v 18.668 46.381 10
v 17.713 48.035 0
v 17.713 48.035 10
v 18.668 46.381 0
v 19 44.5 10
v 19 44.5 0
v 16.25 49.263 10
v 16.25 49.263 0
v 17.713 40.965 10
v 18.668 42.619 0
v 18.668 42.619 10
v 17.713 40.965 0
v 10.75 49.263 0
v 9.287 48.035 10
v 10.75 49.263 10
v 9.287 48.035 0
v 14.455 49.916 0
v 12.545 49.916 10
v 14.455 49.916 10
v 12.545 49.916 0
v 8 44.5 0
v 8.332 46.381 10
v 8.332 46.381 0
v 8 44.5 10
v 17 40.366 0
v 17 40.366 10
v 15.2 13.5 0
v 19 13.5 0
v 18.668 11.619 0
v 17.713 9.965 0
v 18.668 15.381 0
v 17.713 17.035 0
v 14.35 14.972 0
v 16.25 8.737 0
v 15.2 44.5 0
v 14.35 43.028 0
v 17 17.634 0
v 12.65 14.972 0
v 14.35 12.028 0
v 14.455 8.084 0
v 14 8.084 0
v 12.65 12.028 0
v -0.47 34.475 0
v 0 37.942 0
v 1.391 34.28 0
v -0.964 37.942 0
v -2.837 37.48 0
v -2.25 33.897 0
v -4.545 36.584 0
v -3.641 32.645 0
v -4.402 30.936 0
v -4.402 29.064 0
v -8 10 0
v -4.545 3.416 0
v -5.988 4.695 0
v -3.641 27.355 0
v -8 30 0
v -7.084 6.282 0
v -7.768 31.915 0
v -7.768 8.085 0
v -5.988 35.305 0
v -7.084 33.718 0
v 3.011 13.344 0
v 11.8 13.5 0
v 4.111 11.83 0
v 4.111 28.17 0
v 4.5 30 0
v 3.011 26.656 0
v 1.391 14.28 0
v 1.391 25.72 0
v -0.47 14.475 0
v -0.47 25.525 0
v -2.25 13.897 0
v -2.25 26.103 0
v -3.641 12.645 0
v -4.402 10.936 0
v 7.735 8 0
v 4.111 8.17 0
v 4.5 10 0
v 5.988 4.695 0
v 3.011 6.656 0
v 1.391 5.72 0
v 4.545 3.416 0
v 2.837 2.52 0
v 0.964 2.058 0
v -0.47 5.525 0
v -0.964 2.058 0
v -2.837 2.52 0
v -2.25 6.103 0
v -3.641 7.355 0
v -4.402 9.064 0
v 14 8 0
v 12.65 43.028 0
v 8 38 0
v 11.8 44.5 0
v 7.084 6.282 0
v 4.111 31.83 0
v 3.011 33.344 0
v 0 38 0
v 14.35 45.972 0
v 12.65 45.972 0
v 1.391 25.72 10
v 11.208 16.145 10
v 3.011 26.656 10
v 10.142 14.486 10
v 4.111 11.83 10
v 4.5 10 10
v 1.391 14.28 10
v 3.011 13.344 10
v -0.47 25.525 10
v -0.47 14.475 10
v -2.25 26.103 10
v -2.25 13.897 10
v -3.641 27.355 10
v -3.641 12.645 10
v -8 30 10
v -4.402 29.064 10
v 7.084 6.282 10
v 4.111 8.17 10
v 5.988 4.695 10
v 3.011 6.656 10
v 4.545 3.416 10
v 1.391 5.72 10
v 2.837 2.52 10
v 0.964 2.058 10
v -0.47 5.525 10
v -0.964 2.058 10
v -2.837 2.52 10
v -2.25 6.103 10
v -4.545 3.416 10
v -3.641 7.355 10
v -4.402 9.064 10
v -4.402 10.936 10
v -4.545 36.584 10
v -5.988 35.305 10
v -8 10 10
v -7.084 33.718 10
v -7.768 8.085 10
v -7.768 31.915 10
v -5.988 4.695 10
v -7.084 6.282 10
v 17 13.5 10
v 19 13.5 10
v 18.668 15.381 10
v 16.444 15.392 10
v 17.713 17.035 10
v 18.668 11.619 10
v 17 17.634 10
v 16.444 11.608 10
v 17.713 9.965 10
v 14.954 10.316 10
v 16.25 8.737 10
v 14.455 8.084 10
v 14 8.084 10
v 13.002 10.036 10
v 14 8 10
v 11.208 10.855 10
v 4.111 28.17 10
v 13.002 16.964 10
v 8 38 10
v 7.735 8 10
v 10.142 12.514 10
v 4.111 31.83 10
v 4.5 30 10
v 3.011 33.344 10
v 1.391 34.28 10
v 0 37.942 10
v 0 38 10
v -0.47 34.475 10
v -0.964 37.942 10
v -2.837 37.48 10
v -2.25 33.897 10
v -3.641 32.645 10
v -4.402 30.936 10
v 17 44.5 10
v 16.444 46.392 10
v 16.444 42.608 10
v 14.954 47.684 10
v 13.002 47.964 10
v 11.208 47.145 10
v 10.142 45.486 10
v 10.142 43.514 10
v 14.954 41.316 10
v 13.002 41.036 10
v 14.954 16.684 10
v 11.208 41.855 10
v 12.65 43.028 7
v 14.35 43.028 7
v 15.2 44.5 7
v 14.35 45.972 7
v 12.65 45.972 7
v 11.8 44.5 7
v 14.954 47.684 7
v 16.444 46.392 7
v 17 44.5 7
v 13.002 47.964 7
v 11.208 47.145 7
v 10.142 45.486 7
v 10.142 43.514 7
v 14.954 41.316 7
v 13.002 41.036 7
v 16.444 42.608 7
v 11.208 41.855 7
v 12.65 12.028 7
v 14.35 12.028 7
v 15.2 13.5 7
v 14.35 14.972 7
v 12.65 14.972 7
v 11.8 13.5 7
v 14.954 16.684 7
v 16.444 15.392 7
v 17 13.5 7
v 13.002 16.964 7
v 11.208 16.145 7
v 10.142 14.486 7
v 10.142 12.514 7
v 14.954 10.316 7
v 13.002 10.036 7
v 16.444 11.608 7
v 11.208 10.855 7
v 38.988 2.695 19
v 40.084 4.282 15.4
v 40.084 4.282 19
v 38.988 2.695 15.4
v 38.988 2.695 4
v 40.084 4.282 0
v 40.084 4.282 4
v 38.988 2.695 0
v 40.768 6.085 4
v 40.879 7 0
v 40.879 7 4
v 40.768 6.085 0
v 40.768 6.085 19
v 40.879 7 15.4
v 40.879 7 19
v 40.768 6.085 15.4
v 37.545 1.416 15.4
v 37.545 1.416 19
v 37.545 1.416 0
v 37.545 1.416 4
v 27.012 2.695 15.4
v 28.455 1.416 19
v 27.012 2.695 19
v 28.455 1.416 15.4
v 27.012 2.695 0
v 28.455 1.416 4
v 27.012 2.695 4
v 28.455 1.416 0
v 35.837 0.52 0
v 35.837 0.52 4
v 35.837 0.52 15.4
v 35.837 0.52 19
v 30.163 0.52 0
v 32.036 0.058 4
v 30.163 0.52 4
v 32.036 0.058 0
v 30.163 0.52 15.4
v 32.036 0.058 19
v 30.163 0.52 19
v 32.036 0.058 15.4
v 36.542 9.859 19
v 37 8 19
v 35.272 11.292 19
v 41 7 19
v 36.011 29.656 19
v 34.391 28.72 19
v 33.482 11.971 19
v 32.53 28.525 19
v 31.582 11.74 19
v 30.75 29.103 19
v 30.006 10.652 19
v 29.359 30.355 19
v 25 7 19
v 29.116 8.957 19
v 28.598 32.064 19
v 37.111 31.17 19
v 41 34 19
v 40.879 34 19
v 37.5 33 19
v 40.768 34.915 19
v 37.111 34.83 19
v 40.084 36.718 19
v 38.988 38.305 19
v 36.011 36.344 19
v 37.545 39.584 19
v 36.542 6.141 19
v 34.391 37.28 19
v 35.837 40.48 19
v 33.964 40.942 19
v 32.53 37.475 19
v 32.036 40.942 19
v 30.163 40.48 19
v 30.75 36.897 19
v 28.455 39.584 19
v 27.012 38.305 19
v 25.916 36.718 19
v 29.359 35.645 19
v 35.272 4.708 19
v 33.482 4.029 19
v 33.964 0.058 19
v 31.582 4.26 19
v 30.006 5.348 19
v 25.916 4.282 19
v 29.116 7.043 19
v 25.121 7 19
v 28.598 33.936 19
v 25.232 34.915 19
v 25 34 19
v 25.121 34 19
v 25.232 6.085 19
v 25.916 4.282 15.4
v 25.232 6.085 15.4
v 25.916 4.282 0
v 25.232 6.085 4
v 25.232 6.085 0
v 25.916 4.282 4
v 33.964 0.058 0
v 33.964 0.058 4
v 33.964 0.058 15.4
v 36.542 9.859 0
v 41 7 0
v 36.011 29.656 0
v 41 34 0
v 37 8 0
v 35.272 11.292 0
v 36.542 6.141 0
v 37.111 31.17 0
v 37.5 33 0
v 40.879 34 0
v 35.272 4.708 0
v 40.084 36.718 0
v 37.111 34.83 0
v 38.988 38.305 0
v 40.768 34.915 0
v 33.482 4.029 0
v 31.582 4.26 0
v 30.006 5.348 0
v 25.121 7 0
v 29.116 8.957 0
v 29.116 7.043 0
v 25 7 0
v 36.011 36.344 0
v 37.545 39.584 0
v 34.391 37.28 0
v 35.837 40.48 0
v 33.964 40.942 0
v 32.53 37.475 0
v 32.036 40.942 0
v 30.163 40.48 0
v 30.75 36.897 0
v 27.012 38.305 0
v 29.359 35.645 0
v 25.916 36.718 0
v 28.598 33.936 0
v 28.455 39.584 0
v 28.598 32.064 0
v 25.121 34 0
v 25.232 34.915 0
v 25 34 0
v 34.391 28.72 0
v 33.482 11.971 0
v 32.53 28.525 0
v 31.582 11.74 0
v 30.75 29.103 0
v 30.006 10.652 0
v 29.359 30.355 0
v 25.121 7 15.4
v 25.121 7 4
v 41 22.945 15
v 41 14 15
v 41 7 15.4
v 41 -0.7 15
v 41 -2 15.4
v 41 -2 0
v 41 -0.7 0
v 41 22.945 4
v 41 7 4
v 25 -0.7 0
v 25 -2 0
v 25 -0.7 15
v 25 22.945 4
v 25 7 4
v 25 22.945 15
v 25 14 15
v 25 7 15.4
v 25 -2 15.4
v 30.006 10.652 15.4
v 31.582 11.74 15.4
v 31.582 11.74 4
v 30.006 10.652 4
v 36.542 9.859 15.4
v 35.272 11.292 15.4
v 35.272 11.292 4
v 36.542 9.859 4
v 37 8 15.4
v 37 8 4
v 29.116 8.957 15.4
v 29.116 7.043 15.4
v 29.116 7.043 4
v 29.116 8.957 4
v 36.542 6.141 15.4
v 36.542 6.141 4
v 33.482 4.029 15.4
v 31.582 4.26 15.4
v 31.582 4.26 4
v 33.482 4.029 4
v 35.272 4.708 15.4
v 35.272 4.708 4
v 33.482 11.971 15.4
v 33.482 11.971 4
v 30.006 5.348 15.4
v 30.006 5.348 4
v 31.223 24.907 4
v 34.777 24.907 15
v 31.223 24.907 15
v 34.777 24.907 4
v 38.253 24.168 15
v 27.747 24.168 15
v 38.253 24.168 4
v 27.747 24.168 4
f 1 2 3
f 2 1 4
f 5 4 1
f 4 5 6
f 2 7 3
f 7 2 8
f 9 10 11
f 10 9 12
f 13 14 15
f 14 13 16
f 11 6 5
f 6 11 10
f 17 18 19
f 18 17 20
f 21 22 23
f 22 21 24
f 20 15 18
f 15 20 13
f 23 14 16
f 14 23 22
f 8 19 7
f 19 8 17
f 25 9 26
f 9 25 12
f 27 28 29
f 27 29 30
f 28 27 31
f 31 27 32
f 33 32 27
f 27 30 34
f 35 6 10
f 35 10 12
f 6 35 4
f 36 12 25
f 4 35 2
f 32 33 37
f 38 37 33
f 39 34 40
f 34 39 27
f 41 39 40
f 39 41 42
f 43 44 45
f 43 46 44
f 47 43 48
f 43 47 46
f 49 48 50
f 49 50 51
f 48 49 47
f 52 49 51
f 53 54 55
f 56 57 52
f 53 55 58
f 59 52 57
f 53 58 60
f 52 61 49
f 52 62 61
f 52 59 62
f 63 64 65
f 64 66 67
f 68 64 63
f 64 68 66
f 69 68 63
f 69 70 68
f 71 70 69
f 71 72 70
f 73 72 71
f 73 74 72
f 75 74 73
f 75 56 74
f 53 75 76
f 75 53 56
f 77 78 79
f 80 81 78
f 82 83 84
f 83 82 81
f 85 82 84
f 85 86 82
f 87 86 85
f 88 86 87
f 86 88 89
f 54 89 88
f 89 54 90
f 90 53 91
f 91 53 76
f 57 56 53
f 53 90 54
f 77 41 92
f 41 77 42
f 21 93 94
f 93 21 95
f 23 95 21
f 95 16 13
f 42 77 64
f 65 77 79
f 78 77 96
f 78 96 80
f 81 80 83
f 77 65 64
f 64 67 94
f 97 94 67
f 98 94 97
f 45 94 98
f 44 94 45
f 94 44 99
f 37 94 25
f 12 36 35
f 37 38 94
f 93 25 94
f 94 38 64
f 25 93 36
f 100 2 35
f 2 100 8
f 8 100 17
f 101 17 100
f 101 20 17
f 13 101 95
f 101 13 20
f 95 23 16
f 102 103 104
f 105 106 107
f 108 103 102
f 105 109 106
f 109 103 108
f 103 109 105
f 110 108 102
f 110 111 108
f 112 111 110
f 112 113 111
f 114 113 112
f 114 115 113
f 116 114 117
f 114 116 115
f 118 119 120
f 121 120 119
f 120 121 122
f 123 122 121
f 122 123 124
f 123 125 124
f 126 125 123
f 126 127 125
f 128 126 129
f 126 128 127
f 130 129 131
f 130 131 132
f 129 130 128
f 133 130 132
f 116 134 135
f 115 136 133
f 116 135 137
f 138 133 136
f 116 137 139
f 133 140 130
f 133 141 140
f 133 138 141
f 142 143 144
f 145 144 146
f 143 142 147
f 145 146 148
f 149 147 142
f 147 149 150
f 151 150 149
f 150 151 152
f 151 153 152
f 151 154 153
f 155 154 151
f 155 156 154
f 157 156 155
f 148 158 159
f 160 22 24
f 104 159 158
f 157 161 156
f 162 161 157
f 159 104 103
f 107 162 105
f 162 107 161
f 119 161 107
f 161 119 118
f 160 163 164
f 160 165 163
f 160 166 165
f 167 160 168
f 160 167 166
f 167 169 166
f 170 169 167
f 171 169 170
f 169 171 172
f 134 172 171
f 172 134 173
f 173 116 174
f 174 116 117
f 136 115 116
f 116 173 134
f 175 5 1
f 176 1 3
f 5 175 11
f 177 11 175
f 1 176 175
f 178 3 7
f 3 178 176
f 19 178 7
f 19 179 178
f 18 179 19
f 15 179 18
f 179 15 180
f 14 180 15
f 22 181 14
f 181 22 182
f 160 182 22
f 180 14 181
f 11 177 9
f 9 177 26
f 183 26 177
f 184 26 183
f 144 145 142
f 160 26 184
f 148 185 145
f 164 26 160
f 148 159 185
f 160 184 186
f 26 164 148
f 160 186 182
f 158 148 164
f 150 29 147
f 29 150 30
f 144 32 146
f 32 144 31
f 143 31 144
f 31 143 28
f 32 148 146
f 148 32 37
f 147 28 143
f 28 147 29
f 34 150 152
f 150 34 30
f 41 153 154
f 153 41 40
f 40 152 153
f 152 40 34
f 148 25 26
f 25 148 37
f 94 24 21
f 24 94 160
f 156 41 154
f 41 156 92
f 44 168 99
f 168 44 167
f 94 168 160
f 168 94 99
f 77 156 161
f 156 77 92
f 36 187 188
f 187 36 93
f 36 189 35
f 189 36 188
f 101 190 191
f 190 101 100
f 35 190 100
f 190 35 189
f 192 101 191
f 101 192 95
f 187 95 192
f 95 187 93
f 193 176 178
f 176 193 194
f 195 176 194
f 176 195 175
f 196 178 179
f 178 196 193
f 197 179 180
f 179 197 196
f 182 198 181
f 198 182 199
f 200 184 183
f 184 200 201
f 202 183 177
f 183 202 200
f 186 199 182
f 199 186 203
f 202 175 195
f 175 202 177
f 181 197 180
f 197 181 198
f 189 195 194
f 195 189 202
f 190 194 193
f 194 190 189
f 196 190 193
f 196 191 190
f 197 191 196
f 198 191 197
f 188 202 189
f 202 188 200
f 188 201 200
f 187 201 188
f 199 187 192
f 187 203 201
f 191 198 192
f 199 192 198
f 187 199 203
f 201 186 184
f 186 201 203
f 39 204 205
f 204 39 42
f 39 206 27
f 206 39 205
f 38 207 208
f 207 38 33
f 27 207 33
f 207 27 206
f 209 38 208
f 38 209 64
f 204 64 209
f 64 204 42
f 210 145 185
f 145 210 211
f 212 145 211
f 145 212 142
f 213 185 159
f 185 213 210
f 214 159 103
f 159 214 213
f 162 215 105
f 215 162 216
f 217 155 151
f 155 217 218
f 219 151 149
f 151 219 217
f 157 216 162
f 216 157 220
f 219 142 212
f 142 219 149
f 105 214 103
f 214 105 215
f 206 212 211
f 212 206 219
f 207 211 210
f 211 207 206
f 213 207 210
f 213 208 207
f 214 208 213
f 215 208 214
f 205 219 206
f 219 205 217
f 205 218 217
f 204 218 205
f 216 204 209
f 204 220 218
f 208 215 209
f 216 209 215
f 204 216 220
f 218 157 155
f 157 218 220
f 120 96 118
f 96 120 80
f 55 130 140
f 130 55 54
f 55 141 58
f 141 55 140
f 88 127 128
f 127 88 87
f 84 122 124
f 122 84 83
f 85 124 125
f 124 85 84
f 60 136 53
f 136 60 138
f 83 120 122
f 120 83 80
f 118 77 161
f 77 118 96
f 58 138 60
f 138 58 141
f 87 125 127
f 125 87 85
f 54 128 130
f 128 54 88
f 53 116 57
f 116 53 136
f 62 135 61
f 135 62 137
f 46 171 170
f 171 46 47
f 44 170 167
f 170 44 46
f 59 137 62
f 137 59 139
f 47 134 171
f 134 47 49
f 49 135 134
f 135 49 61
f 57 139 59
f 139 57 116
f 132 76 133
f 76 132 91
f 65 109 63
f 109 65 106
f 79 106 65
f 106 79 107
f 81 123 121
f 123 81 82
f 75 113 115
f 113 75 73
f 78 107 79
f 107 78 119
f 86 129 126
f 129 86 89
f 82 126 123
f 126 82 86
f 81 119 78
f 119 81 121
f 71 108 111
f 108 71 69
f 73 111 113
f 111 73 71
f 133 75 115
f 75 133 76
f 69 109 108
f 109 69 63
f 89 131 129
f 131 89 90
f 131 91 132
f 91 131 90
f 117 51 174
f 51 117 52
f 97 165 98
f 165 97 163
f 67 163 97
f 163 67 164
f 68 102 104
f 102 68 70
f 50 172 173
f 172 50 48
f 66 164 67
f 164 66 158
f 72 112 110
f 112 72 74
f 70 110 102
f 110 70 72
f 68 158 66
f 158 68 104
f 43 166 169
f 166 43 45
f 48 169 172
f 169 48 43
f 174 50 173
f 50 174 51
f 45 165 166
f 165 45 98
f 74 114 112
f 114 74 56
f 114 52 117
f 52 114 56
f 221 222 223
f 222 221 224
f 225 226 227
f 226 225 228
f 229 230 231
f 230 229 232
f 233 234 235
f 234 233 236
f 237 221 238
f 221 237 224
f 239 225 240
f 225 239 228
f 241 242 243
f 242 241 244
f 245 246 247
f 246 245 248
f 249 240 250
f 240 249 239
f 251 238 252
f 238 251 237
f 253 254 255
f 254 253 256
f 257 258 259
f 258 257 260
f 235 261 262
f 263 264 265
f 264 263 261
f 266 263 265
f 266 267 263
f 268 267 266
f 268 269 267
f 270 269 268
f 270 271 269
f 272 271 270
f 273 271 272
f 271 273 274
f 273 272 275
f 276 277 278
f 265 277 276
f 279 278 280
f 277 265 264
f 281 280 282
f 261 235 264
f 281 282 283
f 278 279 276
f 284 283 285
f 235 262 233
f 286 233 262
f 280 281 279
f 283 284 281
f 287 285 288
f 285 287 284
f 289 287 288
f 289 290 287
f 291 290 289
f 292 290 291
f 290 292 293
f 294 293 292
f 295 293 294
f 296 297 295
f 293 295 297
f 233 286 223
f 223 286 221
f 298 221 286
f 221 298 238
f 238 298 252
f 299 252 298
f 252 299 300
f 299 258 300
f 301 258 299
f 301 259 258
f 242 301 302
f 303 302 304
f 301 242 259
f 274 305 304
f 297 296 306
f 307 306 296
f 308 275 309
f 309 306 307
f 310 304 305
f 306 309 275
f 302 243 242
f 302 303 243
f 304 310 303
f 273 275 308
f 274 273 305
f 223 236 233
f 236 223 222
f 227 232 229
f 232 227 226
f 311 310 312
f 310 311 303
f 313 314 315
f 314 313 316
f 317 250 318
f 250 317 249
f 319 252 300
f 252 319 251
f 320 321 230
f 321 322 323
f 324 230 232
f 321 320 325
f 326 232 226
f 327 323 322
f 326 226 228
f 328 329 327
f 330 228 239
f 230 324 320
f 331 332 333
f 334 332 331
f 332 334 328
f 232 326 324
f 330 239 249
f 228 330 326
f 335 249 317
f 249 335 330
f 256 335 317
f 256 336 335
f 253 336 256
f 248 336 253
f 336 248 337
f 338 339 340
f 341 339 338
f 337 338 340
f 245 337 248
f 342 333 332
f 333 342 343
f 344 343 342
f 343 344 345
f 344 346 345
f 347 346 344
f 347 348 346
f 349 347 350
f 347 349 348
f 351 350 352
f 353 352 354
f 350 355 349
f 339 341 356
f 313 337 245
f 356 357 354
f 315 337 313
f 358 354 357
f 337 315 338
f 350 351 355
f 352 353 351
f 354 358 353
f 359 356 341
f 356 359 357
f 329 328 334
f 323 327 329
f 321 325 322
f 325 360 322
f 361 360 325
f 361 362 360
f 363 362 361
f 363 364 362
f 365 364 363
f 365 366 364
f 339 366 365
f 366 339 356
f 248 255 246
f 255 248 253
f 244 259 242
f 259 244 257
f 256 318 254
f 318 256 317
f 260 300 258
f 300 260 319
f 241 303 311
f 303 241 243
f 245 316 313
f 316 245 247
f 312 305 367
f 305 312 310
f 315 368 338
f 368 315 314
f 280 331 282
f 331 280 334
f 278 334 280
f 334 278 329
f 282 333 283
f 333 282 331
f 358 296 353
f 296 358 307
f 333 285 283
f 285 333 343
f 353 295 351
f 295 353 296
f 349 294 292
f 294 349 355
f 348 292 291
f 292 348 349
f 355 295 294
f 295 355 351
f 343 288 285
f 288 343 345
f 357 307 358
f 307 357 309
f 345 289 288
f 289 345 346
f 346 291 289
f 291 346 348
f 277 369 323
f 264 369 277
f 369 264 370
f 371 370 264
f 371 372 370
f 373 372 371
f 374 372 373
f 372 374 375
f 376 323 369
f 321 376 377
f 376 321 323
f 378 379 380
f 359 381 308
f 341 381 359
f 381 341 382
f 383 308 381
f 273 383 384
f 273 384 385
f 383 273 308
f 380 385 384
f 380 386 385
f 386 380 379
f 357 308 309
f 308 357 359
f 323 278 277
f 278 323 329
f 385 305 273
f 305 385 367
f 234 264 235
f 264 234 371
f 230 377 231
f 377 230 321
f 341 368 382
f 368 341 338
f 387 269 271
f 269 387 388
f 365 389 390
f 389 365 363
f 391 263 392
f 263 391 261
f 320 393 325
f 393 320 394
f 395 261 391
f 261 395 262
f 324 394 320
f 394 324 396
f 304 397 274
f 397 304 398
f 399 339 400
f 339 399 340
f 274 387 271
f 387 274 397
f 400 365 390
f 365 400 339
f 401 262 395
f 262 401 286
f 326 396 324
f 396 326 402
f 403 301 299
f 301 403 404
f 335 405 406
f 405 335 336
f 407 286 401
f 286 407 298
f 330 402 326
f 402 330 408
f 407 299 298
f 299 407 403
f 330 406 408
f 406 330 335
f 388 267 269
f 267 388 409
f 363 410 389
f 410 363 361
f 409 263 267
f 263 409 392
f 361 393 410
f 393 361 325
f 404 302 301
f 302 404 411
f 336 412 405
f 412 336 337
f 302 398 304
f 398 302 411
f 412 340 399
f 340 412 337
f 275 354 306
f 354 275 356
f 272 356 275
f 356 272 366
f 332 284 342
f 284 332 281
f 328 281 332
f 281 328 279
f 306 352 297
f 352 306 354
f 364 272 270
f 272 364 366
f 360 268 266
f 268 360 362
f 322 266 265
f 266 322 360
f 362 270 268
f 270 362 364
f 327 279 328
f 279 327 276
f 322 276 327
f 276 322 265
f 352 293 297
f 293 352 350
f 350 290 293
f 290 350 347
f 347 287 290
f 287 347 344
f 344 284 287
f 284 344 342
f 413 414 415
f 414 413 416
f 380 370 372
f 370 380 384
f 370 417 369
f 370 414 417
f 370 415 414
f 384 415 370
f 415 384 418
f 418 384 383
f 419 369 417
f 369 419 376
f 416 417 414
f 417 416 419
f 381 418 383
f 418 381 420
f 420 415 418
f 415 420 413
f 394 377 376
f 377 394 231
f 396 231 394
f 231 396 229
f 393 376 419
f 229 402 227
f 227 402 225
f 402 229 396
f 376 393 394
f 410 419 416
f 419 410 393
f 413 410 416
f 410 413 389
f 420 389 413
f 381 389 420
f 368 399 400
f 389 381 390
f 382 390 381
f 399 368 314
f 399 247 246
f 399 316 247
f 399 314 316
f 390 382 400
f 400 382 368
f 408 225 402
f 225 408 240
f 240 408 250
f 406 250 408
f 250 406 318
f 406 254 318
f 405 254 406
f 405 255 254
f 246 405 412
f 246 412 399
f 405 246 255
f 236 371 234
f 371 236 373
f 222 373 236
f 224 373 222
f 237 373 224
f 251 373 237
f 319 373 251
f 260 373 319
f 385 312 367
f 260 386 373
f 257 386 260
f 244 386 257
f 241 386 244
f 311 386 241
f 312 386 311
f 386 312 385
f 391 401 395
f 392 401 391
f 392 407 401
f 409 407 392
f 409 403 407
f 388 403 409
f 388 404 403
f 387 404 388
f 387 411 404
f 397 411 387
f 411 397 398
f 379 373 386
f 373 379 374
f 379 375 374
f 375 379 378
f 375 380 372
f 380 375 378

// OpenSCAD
// file: metric.scad
// PRUSA Mendel  
// Default metric sizes
// GNU GPL v3
// Josef Průša
// josefprusa@me.com
// prusadjs.cz
// http://www.reprap.org/wiki/Prusa_Mendel
// http://github.com/prusajr/PrusaMendel

// DONT CHANGE THIS FILE! ALTER VALUES IN CONFIGURATION.SCAD INSTEAD

// RODS

threaded_rod_diameter = 8.7;
threaded_rod_diameter_horizontal = 8.7;
smooth_bar_diameter = 8;
smooth_bar_diameter_horizontal = 8.5;

// Nuts and bolts

m8_diameter = 9;
m8_nut_diameter = 14.1;

m4_diameter = 4.5;
m4_nut_diameter = 9;

m3_diameter = 3.6;
m3_nut_diameter = 5.3;
m3_nut_diameter_horizontal = 6.1;

// Bushing holder

bushing_core_diameter = smooth_bar_diameter;
bushing_material_thickness = 1;

// Motors

motor_shaft = 5.5;
// file: configuration.scad
// PRUSA Mendel  
// Configuration file
// GNU GPL v3
// Josef Průša
// josefprusa@me.com
// prusadjs.cz
// http://www.reprap.org/wiki/Prusa_Mendel
// http://github.com/prusajr/PrusaMendel

// PLEASE SELECT ONE OF THE CONFIGURATIONS BELOW
// BY UN-COMMENTING IT

// Uncomment for metric settings
// METRIC METRIC METRIC METRIC METRIC METRIC METRIC METRIC 

include <metric.scad>;

// CUSTOM CUSTOM CUSTOM CUSTOM CUSTOM CUSTOM CUSTOM CUSTOM CUSTOM

thin_wall = 3;


// Linear bearing version
linear = false;
// set false for LM-8UU, true for LM-E-8UU (ignore if linear is set to false)
lme8uu = false;

//Machine dimensions

board_thickness = 16;
board_to_xz_distance = 26;

belt_tooth_distance = 2.5;
belt_tooth_stride = 0.5;

// CHANGE ONLY THE STUFF YOU KNOW
// IT WILL REPLACE DEFAULT SETTING

// RODS

// threaded_rod_diameter = 0;
// threaded_rod_diameter_horizontal = 0;
// smooth_bar_diameter = 0;
// smooth_bar_diameter_horizontal = 0;

// Nuts and bolts

// m8_diameter = 0;
// m8_nut_diameter = 0;

// m4_diameter = 0;
// m4_nut_diameter = 0;

// m3_diameter = 0;
// m3_nut_diameter = 0;

// Bushing holder

// bushing_core_diameter = smooth_bar_diameter;
// bushing_material_thickness = 0;


///counted stuff
m3_nut_diameter_bigger = ((m3_nut_diameter  / 2) / cos (180 / 6))*2;

// functions 
include <functions.scad>
// file: functions.scad
// PRUSA Mendel  
// Functions used in many files
// GNU GPL v3
// Josef Průša
// josefprusa@me.com
// prusadjs.cz
// http://www.reprap.org/wiki/Prusa_Mendel
// http://github.com/prusajr/PrusaMendel


module nut(d,h,horizontal=true){
    cornerdiameter =  (d / 2) / cos (180 / 6);
    cylinder(h = h, r = cornerdiameter, $fn = 6);
    if(horizontal){
        for(i = [1:6]){
            rotate([0,0,60*i]) translate([-cornerdiameter-0.2,0,0]) rotate([0,0,-45]) cube(size = [2,2,h]);
        }
    }
}

// Based on nophead research
module polyhole(d, h, center=false) {
    n = max(round(2 * d),3);
    rotate([0,0,180])
        cylinder(h = h, r = (d / 2) / cos (180 / n), $fn = n);
}

// make it interchangeable between this and cylinder
module cylinder_poly(r, h, center=false){
    polyhole(d=r*2, h=h, center=center);
}

module fillet(radius, height=100, $fn=16) {
    //this creates acutal fillet
    translate([-radius, -radius, -height/2-0.01])
        difference() {
            cube([radius*2, radius*2, height+0.02]);
            cylinder(r=radius, h=height+0.02, $fn=16);
        }
}


module cube_fillet(size, radius=-1, vertical=[3,3,3,3], top=[0,0,0,0], bottom=[0,0,0,0], center=false, $fn=0){
    //
    if (center) {
        cube_fillet_inside(size, radius, vertical, top, bottom, $fn);
    } else {
        translate([size[0]/2, size[1]/2, size[2]/2])
            cube_fillet_inside(size, radius, vertical, top, bottom, $fn);
    }
}

module cube_negative_fillet(size, radius=-1, vertical=[3,3,3,3], top=[0,0,0,0], bottom=[0,0,0,0], $fn=0){

    j=[1,0,1,0];

    for (i=[0:3]) {
        if (radius > -1) {
            rotate([0, 0, 90*i]) translate([size[1-j[i]]/2, size[j[i]]/2, 0]) fillet(radius, size[2], $fn=$fn);
        } else {
            rotate([0, 0, 90*i]) translate([size[1-j[i]]/2, size[j[i]]/2, 0]) fillet(vertical[i], size[2], $fn=$fn);
        }
        rotate([90*i, -90, 0]) translate([size[2]/2, size[j[i]]/2, 0 ]) fillet(top[i], size[1-j[i]], $fn=$fn);
        rotate([90*(4-i), 90, 0]) translate([size[2]/2, size[j[i]]/2, 0]) fillet(bottom[i], size[1-j[i]], $fn=$fn);

    }
}

module cube_fillet_inside(size, radius=-1, vertical=[3,3,3,3], top=[0,0,0,0], bottom=[0,0,0,0], $fn=0){
    //makes CENTERED cube with round corners
    // if you give it radius, it will fillet vertical corners.
    //othervise use vertical, top, bottom arrays
    //when viewed from top, it starts in upper right corner (+x,+y quadrant) , goes counterclockwise
    //top/bottom fillet starts in dorection of Y axis and goes CCW too 


    if (radius == 0) {
        cube(size, center=true);
    } else {
        difference() {
            cube(size, center=true);
            cube_negative_fillet(size, radius, vertical, top, bottom, $fn);
        }
    }
}


module nema(places=[0,1,1,1], size=15.5, h=10, holes=false, shadow=0, $fn=0){
    for (i=[0:3]) {
        if (places[i]) {
            rotate([0, 0, 90*i]) translate([size, size, 0]) {
                if (holes) {
                    rotate([0, 0, -90*i])  screw(r=1.7, slant=false, head_drop=3, $fn=$fn, h=h+2);
                } else {
                    rotate([0, 0, -90*i]) cylinder(h=h, r=5.5, $fn=$fn);
                }
            }
        }
    }
    if (shadow > 0) {
        %translate ([0, 0, shadow+21+3]) cube(size = [42,42,42], center = true);
    }
}

module screw(h=20, r=2, r_head=3.5, head_drop=0, slant=true, poly=false, $fn=0){
    //makes screw with head
    //for substraction as screw hole
    if (poly) {
        cylinder_poly(h=h, r=r, $fn=$fn);
    } else {
        cylinder(h=h, r=r, $fn=$fn);
    }
    if (slant) {
        translate([0, 0, head_drop-0.01]) cylinder(h=r_head, r2=0, r1=r_head, $fn=$fn);
    }

    if (head_drop > 0) {
        translate([0, 0, -0.01]) cylinder(h=head_drop+0.01, r=r_head, $fn=$fn);
    }
}

//cube_fillet([10,20,30], vertical=[3,2,0,0], top=[3,2,0,5], bottom=[3,2,0,5]);
//cube_fillet([10,20,30], radius=2, top=[7,2,7,2]);
// main file
// PRUSA Mendel  
// Y drivetrain (except bed parts)
// GNU GPL v3
// Josef Prusa
// http://www.reprap.org/wiki/Prusa_Mendel
// http://github.com/prusajr/PrusaMendel

use <functions.scad>
include <configuration.scad>

module motorholder(thickness=10){
    difference(){
        union(){
            // Motor holding part
            translate(v = [29,-21+50,0])
            {
                //#cube(size = [42,42,2], center=true);
                difference(){
                    union(){
                        translate(v = [-21+4.5,0,5]) cube(size = [9,31,thickness], center=true);
                        nema([0,1,1,0], thickness=thickness);
                        // Parts joining part
                        translate(v = [-29,-21,0]) cube(size = [14,30,thickness]);
                    }
                    // Motor mounting holes
                    translate([0,0,thickness]) mirror([0,0,1]) nema([0,1,1,0], thickness=thickness, holes=true);
                }
            }

            // Front holding part
            translate(v = [0,10,0]) cylinder(h = thickness, r=8);
            translate(v = [0,20,5])cube(size = [16,20,thickness], center=true);
            translate(v = [0,30,0])cylinder(h = thickness, r=8);
        }
        translate(v = [0,10,-1]) cylinder(h = 12, r=4.5);
        translate(v = [0,30,-1])cylinder(h = 12, r=4.5);
    }
}


module idlermount(support=false){
    difference(){
        union(){
            translate(v = [8,8,0]) cylinder(h = 19, r=8);
            translate(v = [8,33,0]) cylinder(h = 19, r=8);
            translate(v = [0,7,0]) cube([16,27,19]);
        }
        translate(v = [8,8,-1]) cylinder(h = 120, r=4);
        translate(v = [8,33,-1])cylinder(h = 25, r=4.5);

        translate(v = [8,8,4])cylinder(h = 11, r=17);
    }
    if (support) {
        translate([0,-2,15]) cube([16,16,0.4]);
        translate([0,-2,0]) cube([16,1.3,15]);
    }

}

module idler(){
    difference(){
        union(){
            translate(v = [0,10,2.5])cube(size = [17,20,16], center=true);
        }
        translate(v = [0,0,-1]) cylinder(h = 20, r=4.5, $fn=15);
    }
}

motorholder();
translate([25,0,0])  idlermount(true);
